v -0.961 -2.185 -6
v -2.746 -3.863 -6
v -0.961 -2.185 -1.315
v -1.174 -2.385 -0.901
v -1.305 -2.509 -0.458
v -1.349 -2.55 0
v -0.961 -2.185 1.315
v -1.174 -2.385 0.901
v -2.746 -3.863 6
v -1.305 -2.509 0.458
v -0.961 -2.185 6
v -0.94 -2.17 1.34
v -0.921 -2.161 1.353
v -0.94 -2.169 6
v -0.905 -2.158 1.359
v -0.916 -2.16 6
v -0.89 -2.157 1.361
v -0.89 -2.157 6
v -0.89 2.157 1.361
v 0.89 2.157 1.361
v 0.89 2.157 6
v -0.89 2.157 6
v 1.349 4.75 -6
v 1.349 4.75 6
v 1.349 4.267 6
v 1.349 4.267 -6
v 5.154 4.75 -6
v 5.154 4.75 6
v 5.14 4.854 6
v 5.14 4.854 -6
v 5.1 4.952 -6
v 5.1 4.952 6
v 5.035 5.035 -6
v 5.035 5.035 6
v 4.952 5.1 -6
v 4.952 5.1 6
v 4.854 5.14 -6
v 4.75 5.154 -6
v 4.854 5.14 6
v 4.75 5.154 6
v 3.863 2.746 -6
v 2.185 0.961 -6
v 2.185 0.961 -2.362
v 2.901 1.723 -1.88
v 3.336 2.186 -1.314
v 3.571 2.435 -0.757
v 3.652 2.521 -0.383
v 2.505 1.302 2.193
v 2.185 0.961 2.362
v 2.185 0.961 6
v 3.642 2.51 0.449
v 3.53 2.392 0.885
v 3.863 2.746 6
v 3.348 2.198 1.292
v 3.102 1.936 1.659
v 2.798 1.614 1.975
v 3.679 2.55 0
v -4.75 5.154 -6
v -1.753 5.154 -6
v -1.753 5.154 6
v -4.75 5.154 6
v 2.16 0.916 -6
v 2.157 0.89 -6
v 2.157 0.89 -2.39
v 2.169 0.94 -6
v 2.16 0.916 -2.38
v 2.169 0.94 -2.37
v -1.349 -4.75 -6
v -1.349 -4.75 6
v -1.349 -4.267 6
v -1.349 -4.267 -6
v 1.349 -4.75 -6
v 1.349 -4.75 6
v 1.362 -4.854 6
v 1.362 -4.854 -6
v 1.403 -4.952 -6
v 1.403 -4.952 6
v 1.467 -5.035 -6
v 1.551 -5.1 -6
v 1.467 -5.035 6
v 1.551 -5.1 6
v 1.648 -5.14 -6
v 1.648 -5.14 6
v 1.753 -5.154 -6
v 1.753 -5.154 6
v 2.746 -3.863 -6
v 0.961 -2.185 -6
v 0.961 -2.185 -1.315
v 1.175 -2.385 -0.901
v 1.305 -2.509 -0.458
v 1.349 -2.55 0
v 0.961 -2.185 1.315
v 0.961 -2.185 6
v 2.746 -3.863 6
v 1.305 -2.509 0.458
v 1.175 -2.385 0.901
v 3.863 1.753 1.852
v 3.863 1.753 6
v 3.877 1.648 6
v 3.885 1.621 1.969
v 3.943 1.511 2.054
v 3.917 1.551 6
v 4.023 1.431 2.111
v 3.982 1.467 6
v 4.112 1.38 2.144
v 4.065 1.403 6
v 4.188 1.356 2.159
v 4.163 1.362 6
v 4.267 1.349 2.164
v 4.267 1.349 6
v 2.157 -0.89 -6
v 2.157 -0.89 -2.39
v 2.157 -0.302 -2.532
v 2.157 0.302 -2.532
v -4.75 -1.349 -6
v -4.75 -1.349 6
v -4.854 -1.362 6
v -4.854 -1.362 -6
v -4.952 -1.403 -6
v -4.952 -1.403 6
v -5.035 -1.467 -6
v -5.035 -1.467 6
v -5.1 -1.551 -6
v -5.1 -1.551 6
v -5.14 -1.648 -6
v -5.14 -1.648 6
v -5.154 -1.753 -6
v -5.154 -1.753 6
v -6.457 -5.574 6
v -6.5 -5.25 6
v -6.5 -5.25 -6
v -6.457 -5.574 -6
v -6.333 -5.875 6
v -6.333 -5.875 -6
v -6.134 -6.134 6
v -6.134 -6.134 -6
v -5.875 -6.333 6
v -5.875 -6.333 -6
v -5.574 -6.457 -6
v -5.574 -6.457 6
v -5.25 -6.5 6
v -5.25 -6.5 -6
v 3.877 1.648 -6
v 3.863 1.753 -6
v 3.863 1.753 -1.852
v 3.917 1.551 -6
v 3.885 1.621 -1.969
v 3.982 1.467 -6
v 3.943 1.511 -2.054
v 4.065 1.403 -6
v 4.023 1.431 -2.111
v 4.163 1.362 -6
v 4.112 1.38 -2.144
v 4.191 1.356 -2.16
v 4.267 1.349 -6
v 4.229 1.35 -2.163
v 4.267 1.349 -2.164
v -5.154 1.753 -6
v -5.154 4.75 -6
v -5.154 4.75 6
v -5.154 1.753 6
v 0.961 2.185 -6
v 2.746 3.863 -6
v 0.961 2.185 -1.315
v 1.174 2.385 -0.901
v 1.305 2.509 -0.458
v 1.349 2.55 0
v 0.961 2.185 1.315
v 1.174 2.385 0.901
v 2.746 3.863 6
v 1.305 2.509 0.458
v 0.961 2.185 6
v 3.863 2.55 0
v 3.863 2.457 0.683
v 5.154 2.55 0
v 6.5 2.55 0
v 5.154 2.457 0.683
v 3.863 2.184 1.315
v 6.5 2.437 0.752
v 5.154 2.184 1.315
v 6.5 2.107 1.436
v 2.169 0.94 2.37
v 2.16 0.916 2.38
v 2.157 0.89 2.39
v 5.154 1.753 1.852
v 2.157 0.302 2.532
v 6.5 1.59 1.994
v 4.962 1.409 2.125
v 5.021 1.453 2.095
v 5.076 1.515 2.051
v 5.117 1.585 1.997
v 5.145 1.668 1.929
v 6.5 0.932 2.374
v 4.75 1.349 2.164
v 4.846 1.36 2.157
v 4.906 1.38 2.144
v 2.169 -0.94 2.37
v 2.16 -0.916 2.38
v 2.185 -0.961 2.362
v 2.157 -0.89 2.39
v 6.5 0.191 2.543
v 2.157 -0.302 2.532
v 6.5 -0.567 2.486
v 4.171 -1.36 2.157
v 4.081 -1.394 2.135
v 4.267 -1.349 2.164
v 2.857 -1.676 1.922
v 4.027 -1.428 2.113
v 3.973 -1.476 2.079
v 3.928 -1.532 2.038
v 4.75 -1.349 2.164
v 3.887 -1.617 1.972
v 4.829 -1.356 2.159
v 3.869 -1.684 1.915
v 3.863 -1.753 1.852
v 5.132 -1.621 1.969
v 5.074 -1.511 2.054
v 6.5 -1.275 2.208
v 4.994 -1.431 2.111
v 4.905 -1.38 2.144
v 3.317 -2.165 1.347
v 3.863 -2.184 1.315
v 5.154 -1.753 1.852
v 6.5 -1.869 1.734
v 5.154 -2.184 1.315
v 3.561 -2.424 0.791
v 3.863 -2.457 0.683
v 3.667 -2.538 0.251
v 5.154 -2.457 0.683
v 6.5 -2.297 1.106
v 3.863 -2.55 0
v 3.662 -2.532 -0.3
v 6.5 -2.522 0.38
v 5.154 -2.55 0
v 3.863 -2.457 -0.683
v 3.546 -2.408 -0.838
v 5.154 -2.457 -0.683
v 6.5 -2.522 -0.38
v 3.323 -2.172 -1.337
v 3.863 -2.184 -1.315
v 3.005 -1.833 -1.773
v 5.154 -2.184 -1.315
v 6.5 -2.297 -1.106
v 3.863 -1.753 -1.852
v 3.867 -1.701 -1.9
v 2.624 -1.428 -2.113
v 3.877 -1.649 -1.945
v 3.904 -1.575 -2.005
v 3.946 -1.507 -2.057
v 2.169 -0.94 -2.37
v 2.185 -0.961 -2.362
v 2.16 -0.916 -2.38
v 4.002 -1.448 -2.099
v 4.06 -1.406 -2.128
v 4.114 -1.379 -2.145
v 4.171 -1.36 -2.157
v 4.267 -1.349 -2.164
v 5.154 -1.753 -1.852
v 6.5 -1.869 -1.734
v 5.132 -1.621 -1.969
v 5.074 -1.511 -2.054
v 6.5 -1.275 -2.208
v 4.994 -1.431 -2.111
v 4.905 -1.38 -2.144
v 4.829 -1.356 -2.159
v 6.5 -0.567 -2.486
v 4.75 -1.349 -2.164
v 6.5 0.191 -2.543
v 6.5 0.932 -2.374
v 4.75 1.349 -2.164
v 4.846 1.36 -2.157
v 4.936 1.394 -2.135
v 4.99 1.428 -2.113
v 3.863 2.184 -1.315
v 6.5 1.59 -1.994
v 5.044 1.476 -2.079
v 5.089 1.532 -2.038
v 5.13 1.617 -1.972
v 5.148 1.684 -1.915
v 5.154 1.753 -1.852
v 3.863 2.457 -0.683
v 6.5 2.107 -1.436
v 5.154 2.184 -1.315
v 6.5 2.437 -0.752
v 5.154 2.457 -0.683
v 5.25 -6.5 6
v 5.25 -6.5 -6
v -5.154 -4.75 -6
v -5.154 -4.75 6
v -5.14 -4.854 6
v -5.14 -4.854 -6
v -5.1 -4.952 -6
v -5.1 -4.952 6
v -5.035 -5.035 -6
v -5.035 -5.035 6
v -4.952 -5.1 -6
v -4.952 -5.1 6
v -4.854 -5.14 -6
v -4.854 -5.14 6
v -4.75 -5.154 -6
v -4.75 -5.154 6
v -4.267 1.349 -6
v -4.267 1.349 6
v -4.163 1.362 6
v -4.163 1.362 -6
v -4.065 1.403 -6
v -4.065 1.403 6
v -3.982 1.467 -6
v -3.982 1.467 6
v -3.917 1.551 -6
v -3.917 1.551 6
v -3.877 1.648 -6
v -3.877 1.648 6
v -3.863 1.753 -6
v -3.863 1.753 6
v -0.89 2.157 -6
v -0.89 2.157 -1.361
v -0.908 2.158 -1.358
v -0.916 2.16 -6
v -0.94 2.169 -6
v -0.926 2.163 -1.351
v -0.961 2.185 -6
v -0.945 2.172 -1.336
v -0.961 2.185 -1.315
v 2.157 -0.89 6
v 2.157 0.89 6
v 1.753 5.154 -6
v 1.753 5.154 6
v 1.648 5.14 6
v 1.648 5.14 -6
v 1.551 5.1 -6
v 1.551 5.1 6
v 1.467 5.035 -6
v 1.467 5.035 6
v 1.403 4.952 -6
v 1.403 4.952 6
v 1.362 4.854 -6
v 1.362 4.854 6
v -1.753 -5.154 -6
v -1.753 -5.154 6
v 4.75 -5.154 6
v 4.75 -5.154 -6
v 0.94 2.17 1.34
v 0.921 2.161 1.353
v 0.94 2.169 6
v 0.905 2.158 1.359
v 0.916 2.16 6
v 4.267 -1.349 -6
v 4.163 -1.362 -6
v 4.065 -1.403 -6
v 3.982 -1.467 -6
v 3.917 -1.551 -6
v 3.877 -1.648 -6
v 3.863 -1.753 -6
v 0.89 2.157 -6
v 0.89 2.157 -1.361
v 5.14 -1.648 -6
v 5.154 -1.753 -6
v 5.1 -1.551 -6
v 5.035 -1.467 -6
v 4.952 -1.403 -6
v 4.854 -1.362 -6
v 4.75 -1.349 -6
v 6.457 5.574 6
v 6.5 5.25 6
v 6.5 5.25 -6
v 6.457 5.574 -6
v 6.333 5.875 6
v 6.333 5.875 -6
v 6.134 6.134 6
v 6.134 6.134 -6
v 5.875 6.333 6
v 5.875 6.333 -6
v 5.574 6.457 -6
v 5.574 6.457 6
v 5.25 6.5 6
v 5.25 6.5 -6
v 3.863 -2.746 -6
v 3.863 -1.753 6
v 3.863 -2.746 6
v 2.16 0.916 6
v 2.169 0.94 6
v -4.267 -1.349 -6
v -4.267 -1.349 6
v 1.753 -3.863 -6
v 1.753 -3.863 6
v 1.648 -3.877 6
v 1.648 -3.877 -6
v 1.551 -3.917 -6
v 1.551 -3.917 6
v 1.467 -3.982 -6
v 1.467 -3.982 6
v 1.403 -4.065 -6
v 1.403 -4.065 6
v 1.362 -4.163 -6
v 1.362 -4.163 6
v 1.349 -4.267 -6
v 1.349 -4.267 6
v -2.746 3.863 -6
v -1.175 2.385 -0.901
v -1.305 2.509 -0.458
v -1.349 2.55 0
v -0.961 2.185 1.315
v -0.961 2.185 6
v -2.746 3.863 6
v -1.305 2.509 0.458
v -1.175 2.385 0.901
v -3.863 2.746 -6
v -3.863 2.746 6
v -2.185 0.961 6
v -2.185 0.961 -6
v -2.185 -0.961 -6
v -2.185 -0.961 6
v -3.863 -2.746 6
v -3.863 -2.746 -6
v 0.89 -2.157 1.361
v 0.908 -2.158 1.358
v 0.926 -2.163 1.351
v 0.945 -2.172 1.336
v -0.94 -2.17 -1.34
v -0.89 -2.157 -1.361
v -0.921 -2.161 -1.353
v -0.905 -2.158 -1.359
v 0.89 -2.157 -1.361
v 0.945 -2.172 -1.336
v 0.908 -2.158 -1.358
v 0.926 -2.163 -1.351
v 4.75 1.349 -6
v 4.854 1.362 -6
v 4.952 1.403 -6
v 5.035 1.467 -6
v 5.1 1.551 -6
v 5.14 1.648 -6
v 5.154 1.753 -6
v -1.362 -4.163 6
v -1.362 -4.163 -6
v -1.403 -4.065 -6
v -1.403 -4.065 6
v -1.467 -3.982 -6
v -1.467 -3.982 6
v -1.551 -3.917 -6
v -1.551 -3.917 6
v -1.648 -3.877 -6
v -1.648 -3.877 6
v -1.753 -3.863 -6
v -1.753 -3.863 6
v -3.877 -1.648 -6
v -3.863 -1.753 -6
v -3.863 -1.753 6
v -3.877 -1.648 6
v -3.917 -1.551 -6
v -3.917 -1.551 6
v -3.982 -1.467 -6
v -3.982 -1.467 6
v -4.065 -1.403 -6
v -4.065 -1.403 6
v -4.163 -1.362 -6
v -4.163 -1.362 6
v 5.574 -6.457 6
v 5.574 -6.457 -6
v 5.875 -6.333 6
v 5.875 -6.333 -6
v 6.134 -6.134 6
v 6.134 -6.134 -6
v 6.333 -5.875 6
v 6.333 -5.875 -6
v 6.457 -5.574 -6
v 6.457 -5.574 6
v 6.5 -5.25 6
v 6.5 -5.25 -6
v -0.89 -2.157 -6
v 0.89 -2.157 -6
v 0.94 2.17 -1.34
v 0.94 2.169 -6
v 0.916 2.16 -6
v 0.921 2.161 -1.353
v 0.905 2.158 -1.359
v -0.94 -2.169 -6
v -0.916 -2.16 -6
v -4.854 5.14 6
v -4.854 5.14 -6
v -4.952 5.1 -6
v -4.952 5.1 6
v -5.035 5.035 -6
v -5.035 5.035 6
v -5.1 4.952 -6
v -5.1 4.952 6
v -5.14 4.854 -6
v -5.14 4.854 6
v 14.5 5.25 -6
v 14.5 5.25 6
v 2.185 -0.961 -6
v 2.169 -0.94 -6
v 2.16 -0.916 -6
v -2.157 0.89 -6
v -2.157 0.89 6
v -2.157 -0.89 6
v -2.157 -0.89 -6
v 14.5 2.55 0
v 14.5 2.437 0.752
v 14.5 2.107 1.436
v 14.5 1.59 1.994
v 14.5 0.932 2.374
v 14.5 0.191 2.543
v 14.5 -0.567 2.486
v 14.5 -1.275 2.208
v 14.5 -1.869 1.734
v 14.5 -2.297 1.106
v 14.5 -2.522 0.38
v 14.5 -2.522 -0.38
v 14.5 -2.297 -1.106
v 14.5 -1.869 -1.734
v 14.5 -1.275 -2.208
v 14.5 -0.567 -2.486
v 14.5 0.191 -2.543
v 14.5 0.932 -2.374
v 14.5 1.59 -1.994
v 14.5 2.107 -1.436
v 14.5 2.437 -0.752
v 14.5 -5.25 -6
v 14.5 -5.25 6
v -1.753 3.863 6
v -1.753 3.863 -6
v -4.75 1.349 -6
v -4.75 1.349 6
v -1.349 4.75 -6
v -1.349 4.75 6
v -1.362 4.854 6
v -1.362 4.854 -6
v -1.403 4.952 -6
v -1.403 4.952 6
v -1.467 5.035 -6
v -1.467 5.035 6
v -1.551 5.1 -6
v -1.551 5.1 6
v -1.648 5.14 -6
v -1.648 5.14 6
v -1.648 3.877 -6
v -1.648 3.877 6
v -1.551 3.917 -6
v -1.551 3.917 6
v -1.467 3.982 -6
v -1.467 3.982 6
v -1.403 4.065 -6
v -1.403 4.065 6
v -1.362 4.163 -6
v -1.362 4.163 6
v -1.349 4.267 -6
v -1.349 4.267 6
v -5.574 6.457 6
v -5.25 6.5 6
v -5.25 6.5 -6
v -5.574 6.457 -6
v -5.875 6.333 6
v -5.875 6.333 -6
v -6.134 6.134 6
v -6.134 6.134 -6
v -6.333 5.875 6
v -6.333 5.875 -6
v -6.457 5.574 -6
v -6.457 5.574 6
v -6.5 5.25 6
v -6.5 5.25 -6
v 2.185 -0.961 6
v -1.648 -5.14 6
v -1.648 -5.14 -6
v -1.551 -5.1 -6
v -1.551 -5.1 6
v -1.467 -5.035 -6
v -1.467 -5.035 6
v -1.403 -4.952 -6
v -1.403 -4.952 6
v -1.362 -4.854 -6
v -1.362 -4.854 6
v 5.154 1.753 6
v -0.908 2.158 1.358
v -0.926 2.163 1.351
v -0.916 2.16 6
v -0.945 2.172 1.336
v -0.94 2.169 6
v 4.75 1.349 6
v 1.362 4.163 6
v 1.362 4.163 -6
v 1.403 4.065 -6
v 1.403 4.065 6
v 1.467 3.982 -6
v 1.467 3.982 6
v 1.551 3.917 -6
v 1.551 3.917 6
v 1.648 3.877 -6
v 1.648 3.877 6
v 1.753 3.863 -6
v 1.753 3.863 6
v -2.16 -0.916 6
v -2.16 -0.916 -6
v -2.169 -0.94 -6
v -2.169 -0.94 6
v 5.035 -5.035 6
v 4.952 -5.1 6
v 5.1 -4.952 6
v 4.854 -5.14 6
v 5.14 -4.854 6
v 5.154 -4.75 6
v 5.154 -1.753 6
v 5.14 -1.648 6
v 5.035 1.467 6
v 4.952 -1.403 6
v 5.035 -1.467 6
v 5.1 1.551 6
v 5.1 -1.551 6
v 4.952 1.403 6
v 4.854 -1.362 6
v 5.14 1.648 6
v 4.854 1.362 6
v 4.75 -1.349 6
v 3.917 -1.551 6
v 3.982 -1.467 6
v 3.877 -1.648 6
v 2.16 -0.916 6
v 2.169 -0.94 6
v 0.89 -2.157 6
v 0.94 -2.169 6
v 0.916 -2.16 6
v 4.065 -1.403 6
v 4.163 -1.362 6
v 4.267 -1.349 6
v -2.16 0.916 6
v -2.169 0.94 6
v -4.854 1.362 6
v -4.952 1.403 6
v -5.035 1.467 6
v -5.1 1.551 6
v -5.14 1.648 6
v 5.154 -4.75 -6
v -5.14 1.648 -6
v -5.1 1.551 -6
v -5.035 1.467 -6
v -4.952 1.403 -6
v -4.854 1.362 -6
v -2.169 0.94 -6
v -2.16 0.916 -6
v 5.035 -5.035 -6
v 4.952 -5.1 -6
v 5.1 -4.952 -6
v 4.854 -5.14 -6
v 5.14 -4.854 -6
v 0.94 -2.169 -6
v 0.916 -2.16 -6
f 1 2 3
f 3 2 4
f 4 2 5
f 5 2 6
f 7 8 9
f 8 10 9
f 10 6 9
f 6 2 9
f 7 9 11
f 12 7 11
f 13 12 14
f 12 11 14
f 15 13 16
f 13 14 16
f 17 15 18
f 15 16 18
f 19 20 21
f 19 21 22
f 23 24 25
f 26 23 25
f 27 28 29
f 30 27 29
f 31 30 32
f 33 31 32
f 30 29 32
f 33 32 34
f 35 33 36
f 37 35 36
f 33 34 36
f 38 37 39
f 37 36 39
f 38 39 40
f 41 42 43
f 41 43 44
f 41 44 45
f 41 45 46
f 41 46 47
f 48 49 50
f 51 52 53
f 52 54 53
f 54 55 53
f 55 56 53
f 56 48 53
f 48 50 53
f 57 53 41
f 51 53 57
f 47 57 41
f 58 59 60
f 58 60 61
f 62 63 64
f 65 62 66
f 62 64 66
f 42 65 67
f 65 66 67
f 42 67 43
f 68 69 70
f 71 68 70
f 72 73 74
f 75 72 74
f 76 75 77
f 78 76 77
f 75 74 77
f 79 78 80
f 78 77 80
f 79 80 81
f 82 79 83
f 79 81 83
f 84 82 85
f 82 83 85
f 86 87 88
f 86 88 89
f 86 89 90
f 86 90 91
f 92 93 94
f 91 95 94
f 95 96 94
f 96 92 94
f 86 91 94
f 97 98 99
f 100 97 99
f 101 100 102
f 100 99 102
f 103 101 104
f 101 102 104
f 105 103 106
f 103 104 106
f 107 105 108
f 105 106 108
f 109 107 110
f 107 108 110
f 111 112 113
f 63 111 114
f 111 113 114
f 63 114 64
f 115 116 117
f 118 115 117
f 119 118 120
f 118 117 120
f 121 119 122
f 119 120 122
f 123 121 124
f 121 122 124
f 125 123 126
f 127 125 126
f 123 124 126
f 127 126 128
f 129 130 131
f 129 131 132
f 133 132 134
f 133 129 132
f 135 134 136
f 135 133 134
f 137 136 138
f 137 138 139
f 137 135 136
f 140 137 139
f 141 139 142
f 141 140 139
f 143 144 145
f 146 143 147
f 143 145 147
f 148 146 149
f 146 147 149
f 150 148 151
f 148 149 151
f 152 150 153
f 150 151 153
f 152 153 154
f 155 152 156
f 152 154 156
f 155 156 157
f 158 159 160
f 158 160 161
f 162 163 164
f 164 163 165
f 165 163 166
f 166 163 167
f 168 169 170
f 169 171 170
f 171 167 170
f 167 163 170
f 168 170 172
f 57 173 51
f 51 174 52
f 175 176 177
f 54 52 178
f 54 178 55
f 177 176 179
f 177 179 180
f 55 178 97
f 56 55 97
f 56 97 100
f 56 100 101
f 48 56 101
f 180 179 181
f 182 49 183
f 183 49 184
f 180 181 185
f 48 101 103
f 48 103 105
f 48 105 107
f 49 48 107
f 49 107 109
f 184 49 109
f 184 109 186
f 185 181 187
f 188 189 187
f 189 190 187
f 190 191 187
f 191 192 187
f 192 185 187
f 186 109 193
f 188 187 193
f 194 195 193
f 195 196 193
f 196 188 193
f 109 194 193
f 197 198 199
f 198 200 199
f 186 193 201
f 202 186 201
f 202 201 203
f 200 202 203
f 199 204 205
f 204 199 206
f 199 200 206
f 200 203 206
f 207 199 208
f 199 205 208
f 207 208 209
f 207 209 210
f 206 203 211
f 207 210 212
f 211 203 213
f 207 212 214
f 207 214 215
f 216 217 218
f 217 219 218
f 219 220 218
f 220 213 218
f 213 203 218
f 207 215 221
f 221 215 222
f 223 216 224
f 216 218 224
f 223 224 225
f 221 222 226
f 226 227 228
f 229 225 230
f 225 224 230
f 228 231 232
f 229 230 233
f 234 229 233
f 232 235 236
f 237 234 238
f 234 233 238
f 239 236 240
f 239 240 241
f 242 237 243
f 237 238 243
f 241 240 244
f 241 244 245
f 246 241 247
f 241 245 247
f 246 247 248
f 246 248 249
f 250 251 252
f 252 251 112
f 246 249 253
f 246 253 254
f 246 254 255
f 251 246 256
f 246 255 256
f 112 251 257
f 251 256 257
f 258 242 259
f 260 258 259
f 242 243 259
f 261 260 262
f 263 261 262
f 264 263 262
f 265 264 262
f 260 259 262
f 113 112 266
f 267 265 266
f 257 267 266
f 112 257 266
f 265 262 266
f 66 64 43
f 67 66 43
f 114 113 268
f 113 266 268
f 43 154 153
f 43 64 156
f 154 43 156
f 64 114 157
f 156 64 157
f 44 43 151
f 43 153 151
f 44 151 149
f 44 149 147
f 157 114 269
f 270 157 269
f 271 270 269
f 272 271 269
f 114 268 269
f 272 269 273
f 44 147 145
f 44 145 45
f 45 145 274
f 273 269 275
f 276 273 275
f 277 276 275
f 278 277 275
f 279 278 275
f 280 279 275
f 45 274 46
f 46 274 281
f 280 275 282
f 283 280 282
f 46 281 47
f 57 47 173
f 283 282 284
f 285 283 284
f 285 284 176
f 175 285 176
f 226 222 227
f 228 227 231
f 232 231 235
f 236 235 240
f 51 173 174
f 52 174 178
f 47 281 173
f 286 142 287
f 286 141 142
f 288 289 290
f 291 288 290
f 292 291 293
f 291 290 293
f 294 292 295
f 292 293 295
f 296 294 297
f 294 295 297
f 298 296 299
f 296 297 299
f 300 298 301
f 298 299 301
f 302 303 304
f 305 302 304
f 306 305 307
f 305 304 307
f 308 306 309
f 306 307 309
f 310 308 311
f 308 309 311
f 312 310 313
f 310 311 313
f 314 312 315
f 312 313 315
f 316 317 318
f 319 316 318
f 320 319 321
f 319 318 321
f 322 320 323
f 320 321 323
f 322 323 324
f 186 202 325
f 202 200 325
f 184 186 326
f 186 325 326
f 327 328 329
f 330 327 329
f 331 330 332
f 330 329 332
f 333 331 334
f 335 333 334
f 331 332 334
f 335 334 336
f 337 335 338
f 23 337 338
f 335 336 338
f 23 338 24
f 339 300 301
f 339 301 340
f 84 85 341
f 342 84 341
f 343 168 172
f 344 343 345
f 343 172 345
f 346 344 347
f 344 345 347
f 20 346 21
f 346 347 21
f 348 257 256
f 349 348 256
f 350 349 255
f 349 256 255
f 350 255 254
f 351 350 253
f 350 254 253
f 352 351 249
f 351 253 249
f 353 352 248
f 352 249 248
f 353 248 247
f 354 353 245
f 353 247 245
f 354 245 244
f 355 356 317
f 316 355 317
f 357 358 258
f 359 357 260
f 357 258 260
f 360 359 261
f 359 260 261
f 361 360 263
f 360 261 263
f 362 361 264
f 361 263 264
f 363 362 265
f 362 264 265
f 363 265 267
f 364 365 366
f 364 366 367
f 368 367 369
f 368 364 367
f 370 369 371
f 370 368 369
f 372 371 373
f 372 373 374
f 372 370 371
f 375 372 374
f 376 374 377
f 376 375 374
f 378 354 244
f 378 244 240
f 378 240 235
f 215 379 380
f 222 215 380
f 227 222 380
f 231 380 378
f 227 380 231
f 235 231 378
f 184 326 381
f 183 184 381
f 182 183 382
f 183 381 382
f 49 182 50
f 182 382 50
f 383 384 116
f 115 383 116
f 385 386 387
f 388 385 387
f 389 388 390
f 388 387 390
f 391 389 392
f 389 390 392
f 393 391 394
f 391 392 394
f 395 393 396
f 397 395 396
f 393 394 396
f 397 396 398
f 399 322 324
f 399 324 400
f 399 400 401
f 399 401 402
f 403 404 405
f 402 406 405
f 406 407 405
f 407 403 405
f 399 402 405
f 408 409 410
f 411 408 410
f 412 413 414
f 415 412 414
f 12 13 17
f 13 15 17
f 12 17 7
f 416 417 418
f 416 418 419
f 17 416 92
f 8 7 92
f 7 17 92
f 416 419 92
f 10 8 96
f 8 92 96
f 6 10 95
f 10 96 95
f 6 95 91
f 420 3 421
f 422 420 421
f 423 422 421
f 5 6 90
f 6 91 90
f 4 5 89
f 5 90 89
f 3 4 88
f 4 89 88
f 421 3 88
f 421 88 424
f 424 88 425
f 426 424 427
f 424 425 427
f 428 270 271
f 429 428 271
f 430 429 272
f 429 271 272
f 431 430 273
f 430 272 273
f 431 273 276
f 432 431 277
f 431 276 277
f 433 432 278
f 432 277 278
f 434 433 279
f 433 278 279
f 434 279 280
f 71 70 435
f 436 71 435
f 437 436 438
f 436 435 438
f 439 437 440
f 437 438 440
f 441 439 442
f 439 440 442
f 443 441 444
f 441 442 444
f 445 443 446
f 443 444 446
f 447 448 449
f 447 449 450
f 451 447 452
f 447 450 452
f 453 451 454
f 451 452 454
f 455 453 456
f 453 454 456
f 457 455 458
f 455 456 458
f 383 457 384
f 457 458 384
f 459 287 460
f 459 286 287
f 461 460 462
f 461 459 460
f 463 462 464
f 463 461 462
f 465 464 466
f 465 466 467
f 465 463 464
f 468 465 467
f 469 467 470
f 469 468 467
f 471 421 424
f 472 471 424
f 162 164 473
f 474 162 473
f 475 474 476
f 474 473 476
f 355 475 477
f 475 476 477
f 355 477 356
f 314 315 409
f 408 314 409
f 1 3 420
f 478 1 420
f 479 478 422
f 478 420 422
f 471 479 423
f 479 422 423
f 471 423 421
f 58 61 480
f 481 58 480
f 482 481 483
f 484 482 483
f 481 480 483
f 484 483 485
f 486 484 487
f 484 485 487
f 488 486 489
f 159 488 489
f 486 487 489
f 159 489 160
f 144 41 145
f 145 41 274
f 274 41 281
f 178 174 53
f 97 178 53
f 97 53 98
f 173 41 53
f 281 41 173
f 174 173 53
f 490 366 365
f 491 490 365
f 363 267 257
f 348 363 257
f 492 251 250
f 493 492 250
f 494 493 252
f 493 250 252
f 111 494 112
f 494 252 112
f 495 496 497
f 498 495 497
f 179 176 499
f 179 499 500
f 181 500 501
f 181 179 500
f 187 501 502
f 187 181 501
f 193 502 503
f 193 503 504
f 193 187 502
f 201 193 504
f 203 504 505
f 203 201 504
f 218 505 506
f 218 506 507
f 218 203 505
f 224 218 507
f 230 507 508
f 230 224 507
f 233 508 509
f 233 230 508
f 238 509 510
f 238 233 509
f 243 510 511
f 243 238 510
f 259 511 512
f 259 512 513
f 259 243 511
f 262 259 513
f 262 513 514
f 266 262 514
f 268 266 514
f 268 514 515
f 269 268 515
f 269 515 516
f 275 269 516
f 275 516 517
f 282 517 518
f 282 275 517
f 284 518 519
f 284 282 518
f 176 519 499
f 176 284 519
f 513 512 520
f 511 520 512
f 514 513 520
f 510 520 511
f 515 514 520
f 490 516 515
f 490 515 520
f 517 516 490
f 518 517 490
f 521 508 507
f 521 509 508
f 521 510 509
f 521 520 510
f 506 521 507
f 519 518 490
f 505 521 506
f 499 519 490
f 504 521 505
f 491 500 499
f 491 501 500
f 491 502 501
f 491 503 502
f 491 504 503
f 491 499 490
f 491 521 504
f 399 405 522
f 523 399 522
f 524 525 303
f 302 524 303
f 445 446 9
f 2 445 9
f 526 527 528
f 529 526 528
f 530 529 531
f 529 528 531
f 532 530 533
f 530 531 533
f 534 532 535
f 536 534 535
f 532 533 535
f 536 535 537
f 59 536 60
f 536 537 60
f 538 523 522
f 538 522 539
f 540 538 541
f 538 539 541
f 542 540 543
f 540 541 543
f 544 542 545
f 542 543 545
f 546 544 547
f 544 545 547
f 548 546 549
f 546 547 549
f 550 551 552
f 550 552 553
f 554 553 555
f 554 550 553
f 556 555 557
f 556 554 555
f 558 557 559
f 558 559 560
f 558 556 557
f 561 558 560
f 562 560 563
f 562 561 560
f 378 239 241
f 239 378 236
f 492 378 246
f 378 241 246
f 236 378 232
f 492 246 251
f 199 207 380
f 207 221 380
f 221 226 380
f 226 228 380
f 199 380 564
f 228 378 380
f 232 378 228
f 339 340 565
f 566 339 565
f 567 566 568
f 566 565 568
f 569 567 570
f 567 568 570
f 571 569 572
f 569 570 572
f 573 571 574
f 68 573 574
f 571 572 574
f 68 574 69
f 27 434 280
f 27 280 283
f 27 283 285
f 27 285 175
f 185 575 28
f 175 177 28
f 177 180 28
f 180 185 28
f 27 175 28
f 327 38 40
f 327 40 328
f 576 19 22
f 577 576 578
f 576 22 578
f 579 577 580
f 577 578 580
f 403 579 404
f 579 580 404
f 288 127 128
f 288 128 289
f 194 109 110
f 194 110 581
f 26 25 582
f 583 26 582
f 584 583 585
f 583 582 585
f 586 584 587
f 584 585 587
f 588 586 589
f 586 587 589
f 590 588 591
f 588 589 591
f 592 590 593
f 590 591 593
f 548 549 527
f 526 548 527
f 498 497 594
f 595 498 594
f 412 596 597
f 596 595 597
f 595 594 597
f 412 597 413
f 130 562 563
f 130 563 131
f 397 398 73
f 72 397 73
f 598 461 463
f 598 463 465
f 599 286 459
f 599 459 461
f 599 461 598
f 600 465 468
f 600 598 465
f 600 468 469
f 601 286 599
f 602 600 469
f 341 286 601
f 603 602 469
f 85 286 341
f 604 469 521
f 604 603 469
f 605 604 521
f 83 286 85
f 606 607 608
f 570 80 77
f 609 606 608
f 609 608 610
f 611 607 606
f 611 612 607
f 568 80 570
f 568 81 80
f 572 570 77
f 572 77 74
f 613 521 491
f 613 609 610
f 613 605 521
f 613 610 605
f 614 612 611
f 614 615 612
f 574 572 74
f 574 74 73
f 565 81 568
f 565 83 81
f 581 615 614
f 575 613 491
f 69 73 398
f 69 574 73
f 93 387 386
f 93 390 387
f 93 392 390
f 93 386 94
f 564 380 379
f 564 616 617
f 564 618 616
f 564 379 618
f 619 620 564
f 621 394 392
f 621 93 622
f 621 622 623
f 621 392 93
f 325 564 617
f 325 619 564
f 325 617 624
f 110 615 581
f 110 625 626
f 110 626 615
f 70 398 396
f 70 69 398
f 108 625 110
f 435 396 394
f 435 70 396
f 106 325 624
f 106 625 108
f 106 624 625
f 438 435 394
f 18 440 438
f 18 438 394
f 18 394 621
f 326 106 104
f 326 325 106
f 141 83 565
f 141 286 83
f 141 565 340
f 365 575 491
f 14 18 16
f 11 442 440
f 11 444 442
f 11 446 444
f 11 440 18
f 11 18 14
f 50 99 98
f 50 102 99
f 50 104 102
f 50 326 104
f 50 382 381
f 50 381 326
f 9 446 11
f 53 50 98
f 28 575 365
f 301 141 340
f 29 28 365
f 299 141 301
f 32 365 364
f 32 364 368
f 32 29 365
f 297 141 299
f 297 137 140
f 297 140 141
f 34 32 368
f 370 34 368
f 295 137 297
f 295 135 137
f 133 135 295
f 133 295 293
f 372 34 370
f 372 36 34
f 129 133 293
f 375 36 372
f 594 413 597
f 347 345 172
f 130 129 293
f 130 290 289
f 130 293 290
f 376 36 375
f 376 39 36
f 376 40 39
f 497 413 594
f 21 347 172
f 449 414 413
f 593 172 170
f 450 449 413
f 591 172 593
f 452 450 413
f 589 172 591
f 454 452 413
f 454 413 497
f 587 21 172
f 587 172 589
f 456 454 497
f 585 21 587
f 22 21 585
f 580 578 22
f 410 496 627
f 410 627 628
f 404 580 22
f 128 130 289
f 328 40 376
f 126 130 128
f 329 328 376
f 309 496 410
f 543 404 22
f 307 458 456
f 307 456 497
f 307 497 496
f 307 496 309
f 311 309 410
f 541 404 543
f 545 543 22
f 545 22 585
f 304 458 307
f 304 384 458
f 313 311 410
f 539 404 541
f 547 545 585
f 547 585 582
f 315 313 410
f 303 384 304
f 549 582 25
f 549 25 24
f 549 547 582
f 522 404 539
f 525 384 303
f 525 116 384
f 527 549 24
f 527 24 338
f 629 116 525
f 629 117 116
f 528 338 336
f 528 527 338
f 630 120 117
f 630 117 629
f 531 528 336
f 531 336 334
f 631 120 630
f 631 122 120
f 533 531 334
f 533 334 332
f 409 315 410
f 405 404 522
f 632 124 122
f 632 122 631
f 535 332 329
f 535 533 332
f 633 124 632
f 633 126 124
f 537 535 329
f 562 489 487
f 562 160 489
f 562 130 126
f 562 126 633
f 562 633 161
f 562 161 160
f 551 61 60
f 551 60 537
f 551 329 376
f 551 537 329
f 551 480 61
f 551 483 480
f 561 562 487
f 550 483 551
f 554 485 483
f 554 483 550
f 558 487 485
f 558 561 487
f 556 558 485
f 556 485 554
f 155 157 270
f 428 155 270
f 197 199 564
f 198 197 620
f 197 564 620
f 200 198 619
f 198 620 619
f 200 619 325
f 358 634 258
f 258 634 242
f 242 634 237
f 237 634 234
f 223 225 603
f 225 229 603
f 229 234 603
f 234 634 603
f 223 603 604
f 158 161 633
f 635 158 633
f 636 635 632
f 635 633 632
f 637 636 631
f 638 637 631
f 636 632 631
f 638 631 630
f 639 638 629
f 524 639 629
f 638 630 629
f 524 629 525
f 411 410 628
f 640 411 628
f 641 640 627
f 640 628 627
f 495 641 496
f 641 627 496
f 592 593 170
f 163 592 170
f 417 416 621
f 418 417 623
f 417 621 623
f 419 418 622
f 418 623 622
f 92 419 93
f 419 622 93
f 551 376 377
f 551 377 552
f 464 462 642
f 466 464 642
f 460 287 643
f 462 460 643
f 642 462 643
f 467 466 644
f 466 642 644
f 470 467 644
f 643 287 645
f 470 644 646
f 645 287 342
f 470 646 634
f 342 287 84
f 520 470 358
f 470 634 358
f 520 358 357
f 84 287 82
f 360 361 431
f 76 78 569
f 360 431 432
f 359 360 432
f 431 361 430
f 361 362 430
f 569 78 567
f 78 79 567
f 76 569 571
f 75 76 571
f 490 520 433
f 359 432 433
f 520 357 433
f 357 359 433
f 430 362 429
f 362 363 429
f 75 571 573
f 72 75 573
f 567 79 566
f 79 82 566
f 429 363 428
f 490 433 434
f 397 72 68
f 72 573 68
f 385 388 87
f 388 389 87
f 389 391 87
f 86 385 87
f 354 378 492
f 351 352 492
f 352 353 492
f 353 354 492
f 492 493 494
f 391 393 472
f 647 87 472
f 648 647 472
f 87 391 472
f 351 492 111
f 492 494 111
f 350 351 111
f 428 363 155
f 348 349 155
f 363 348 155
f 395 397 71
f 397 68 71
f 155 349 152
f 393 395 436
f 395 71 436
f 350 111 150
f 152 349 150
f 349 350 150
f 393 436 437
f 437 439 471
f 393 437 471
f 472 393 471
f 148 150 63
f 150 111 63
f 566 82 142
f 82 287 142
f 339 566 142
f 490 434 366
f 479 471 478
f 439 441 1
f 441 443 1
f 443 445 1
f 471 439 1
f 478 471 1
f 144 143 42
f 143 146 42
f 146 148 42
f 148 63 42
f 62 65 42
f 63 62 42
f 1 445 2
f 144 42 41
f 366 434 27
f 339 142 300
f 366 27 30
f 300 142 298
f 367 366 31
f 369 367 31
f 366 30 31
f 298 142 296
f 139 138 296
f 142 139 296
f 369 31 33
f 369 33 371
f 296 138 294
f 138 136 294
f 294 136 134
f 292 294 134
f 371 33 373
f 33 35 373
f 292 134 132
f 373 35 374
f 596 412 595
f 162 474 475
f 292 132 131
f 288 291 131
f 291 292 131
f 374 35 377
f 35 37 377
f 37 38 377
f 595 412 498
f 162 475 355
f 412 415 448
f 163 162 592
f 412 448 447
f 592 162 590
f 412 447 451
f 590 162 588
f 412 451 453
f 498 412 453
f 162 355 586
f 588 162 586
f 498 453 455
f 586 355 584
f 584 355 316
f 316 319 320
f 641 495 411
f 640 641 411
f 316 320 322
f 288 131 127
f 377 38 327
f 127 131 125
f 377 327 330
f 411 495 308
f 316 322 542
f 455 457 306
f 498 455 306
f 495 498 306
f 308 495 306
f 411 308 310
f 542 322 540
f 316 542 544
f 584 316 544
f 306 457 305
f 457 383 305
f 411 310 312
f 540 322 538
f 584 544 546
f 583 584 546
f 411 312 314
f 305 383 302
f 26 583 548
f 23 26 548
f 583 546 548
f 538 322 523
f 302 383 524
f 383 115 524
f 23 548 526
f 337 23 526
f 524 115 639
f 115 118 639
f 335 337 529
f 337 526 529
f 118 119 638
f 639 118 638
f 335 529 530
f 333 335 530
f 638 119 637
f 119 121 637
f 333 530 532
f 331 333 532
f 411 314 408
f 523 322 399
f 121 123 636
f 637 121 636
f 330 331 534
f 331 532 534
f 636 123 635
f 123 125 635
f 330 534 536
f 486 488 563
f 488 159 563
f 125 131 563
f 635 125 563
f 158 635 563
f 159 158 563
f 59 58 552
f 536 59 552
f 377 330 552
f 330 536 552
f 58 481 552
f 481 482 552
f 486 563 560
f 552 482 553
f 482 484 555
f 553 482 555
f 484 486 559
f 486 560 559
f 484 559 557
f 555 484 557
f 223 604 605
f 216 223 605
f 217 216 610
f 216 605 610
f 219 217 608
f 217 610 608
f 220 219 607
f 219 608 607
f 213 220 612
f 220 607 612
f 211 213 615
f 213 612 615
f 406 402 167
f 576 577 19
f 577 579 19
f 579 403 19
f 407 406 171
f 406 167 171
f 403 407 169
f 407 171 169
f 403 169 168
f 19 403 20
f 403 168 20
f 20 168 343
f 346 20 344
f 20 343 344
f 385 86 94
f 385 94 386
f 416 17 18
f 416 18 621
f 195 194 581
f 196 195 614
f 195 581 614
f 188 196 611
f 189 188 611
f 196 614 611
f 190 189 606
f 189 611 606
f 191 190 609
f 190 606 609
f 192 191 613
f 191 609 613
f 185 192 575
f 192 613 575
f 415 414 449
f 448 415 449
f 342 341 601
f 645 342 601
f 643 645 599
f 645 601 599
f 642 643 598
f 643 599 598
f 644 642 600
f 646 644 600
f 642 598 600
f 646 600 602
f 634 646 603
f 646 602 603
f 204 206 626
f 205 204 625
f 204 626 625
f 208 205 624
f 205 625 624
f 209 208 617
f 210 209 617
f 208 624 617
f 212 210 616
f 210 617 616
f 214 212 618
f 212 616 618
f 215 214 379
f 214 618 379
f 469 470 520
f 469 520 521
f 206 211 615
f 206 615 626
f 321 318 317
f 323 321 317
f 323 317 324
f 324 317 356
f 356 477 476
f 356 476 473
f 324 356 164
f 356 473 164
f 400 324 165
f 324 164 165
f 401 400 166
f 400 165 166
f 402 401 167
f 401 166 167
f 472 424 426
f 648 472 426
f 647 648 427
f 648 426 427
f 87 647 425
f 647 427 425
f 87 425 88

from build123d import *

# Parameters (mm, degrees)
F1_DEPTH  = 6
F3_DEPTH  = 10
F4_W      = 10.5
F4_H      = 12
F4_R      = 2.55
F5_DEPTH  = 8
F1_FACE_R = 2.55
F6_DEPTH  = 8.6566


with BuildPart() as f1:
    # F0 (on Top) → F1 (new body, symmetric)
    with BuildSketch(Plane.XY):
        with BuildLine():
            Line((6.5, -5.25), (6.5, 5.25))
            ThreePointArc((6.5, 5.25), (6.133883, 6.133883), (5.25, 6.5))
            Line((5.25, 6.5), (-5.25, 6.5))
            ThreePointArc((-5.25, 6.5), (-6.133883, 6.133883), (-6.5, 5.25))
            Line((-6.5, 5.25), (-6.5, -5.25))
            ThreePointArc((-6.5, -5.25), (-6.133883, -6.133883), (-5.25, -6.5))
            Line((-5.25, -6.5), (5.25, -6.5))
            ThreePointArc((5.25, -6.5), (6.133883, -6.133883), (6.5, -5.25))
        make_face()
    extrude(amount=F1_DEPTH, both=True)

    # F2 (on Top) → F3 (cut, symmetric)
    with BuildSketch(Plane.XY):
        with BuildLine():
            ThreePointArc((0.889914, -2.1566), (0.928239, -2.163918), (0.961171, -2.184843))
            Line((0.961171, -2.184843), (2.745753, -3.863205))
            Line((2.745753, -3.863205), (1.752595, -3.863205))
            ThreePointArc((1.752595, -3.863205), (1.466924, -3.981534), (1.348595, -4.267205))
            Line((1.348595, -4.267205), (1.348595, -4.749805))
            ThreePointArc((1.348595, -4.749805), (1.466924, -5.035476), (1.752595, -5.153805))
            Line((1.752595, -5.153805), (4.749795, -5.153805))
            ThreePointArc((4.749795, -5.153805), (5.035466, -5.035476), (5.153795, -4.749805))
            Line((5.153795, -4.749805), (5.153795, -1.752605))
            ThreePointArc((5.153795, -1.752605), (5.035471, -1.466932), (4.749802, -1.348599))
            Line((4.749802, -1.348599), (4.267202, -1.348599))
            ThreePointArc((4.267202, -1.348599), (3.981531, -1.466927), (3.863202, -1.752599))
            Line((3.863202, -1.752599), (3.863202, -2.745756))
            Line((3.863202, -2.745756), (2.184831, -0.961164))
            ThreePointArc((2.184831, -0.961164), (2.163912, -0.928237), (2.156595, -0.889919))
            Line((2.156595, -0.889919), (2.156595, 0.889909))
            ThreePointArc((2.156595, 0.889909), (2.163912, 0.928229), (2.184834, 0.961157))
            Line((2.184834, 0.961157), (3.863202, 2.745746))
            Line((3.863202, 2.745746), (3.863202, 1.752589))
            ThreePointArc((3.863202, 1.752589), (3.981531, 1.466917), (4.267202, 1.348589))
            Line((4.267202, 1.348589), (4.749802, 1.348589))
            ThreePointArc((4.749802, 1.348589), (5.035473, 1.466917), (5.153802, 1.752589))
            Line((5.153802, 1.752589), (5.153802, 4.749789))
            ThreePointArc((5.153802, 4.749789), (5.035477, 5.035475), (4.749794, 5.153807))
            Line((4.749794, 5.153807), (1.752594, 5.153807))
            ThreePointArc((1.752594, 5.153807), (1.466922, 5.035478), (1.348594, 4.749807))
            Line((1.348594, 4.749807), (1.348594, 4.267207))
            ThreePointArc((1.348594, 4.267207), (1.466922, 3.981536), (1.752594, 3.863207))
            Line((1.752594, 3.863207), (2.745751, 3.863207))
            Line((2.745751, 3.863207), (0.961159, 2.184836))
            ThreePointArc((0.961159, 2.184836), (0.928232, 2.163916), (0.889914, 2.1566))
            Line((0.889914, 2.1566), (-0.889914, 2.1566))
            ThreePointArc((-0.889914, 2.1566), (-0.928238, 2.163918), (-0.961169, 2.184841))
            Line((-0.961169, 2.184841), (-2.745757, 3.863209))
            Line((-2.745757, 3.863209), (-1.7526, 3.863209))
            ThreePointArc((-1.7526, 3.863209), (-1.466929, 3.981538), (-1.3486, 4.267209))
            Line((-1.3486, 4.267209), (-1.3486, 4.749809))
            ThreePointArc((-1.3486, 4.749809), (-1.466937, 5.035473), (-1.752607, 5.153794))
            Line((-1.752607, 5.153794), (-4.749807, 5.153794))
            ThreePointArc((-4.749807, 5.153794), (-5.035478, 5.035465), (-5.153807, 4.749794))
            Line((-5.153807, 4.749794), (-5.153807, 1.752594))
            ThreePointArc((-5.153807, 1.752594), (-5.035478, 1.466922), (-4.749807, 1.348594))
            Line((-4.749807, 1.348594), (-4.267207, 1.348594))
            ThreePointArc((-4.267207, 1.348594), (-3.981536, 1.466922), (-3.863207, 1.752594))
            Line((-3.863207, 1.752594), (-3.863207, 2.745751))
            Line((-3.863207, 2.745751), (-2.184836, 0.961159))
            ThreePointArc((-2.184836, 0.961159), (-2.163916, 0.928232), (-2.1566, 0.889914))
            Line((-2.1566, 0.889914), (-2.1566, -0.889914))
            ThreePointArc((-2.1566, -0.889914), (-2.163918, -0.928238), (-2.184841, -0.961169))
            Line((-2.184841, -0.961169), (-3.863209, -2.745757))
            Line((-3.863209, -2.745757), (-3.863209, -1.7526))
            ThreePointArc((-3.863209, -1.7526), (-3.981538, -1.466929), (-4.267209, -1.3486))
            Line((-4.267209, -1.3486), (-4.749809, -1.3486))
            ThreePointArc((-4.749809, -1.3486), (-5.035481, -1.466929), (-5.153809, -1.7526))
            Line((-5.153809, -1.7526), (-5.153809, -4.7498))
            ThreePointArc((-5.153809, -4.7498), (-5.035481, -5.035471), (-4.749809, -5.1538))
            Line((-4.749809, -5.1538), (-1.752609, -5.1538))
            ThreePointArc((-1.752609, -5.1538), (-1.466938, -5.035471), (-1.348609, -4.7498))
            Line((-1.348609, -4.7498), (-1.348609, -4.2672))
            ThreePointArc((-1.348609, -4.2672), (-1.466935, -3.981539), (-1.752594, -3.863207))
            Line((-1.752594, -3.863207), (-2.745751, -3.863207))
            Line((-2.745751, -3.863207), (-0.961159, -2.184836))
            ThreePointArc((-0.961159, -2.184836), (-0.928232, -2.163916), (-0.889914, -2.1566))
            Line((-0.889914, -2.1566), (0.889914, -2.1566))
        make_face()
    extrude(amount=F3_DEPTH, both=True, mode=Mode.SUBTRACT)

    # F4 (on face) → F5 (join)
    with BuildSketch(Plane.YZ.offset(6.5)):
        Rectangle(F4_W, F4_H)
        Circle(F4_R, mode=Mode.SUBTRACT)
    extrude(amount=F5_DEPTH)

    # F1_face (on face) → F6 (cut, through all)
    with BuildSketch(Plane.YZ.offset(6.5)):
        Circle(F1_FACE_R)
    extrude(amount=-F6_DEPTH, mode=Mode.SUBTRACT)


solid = f1.part
